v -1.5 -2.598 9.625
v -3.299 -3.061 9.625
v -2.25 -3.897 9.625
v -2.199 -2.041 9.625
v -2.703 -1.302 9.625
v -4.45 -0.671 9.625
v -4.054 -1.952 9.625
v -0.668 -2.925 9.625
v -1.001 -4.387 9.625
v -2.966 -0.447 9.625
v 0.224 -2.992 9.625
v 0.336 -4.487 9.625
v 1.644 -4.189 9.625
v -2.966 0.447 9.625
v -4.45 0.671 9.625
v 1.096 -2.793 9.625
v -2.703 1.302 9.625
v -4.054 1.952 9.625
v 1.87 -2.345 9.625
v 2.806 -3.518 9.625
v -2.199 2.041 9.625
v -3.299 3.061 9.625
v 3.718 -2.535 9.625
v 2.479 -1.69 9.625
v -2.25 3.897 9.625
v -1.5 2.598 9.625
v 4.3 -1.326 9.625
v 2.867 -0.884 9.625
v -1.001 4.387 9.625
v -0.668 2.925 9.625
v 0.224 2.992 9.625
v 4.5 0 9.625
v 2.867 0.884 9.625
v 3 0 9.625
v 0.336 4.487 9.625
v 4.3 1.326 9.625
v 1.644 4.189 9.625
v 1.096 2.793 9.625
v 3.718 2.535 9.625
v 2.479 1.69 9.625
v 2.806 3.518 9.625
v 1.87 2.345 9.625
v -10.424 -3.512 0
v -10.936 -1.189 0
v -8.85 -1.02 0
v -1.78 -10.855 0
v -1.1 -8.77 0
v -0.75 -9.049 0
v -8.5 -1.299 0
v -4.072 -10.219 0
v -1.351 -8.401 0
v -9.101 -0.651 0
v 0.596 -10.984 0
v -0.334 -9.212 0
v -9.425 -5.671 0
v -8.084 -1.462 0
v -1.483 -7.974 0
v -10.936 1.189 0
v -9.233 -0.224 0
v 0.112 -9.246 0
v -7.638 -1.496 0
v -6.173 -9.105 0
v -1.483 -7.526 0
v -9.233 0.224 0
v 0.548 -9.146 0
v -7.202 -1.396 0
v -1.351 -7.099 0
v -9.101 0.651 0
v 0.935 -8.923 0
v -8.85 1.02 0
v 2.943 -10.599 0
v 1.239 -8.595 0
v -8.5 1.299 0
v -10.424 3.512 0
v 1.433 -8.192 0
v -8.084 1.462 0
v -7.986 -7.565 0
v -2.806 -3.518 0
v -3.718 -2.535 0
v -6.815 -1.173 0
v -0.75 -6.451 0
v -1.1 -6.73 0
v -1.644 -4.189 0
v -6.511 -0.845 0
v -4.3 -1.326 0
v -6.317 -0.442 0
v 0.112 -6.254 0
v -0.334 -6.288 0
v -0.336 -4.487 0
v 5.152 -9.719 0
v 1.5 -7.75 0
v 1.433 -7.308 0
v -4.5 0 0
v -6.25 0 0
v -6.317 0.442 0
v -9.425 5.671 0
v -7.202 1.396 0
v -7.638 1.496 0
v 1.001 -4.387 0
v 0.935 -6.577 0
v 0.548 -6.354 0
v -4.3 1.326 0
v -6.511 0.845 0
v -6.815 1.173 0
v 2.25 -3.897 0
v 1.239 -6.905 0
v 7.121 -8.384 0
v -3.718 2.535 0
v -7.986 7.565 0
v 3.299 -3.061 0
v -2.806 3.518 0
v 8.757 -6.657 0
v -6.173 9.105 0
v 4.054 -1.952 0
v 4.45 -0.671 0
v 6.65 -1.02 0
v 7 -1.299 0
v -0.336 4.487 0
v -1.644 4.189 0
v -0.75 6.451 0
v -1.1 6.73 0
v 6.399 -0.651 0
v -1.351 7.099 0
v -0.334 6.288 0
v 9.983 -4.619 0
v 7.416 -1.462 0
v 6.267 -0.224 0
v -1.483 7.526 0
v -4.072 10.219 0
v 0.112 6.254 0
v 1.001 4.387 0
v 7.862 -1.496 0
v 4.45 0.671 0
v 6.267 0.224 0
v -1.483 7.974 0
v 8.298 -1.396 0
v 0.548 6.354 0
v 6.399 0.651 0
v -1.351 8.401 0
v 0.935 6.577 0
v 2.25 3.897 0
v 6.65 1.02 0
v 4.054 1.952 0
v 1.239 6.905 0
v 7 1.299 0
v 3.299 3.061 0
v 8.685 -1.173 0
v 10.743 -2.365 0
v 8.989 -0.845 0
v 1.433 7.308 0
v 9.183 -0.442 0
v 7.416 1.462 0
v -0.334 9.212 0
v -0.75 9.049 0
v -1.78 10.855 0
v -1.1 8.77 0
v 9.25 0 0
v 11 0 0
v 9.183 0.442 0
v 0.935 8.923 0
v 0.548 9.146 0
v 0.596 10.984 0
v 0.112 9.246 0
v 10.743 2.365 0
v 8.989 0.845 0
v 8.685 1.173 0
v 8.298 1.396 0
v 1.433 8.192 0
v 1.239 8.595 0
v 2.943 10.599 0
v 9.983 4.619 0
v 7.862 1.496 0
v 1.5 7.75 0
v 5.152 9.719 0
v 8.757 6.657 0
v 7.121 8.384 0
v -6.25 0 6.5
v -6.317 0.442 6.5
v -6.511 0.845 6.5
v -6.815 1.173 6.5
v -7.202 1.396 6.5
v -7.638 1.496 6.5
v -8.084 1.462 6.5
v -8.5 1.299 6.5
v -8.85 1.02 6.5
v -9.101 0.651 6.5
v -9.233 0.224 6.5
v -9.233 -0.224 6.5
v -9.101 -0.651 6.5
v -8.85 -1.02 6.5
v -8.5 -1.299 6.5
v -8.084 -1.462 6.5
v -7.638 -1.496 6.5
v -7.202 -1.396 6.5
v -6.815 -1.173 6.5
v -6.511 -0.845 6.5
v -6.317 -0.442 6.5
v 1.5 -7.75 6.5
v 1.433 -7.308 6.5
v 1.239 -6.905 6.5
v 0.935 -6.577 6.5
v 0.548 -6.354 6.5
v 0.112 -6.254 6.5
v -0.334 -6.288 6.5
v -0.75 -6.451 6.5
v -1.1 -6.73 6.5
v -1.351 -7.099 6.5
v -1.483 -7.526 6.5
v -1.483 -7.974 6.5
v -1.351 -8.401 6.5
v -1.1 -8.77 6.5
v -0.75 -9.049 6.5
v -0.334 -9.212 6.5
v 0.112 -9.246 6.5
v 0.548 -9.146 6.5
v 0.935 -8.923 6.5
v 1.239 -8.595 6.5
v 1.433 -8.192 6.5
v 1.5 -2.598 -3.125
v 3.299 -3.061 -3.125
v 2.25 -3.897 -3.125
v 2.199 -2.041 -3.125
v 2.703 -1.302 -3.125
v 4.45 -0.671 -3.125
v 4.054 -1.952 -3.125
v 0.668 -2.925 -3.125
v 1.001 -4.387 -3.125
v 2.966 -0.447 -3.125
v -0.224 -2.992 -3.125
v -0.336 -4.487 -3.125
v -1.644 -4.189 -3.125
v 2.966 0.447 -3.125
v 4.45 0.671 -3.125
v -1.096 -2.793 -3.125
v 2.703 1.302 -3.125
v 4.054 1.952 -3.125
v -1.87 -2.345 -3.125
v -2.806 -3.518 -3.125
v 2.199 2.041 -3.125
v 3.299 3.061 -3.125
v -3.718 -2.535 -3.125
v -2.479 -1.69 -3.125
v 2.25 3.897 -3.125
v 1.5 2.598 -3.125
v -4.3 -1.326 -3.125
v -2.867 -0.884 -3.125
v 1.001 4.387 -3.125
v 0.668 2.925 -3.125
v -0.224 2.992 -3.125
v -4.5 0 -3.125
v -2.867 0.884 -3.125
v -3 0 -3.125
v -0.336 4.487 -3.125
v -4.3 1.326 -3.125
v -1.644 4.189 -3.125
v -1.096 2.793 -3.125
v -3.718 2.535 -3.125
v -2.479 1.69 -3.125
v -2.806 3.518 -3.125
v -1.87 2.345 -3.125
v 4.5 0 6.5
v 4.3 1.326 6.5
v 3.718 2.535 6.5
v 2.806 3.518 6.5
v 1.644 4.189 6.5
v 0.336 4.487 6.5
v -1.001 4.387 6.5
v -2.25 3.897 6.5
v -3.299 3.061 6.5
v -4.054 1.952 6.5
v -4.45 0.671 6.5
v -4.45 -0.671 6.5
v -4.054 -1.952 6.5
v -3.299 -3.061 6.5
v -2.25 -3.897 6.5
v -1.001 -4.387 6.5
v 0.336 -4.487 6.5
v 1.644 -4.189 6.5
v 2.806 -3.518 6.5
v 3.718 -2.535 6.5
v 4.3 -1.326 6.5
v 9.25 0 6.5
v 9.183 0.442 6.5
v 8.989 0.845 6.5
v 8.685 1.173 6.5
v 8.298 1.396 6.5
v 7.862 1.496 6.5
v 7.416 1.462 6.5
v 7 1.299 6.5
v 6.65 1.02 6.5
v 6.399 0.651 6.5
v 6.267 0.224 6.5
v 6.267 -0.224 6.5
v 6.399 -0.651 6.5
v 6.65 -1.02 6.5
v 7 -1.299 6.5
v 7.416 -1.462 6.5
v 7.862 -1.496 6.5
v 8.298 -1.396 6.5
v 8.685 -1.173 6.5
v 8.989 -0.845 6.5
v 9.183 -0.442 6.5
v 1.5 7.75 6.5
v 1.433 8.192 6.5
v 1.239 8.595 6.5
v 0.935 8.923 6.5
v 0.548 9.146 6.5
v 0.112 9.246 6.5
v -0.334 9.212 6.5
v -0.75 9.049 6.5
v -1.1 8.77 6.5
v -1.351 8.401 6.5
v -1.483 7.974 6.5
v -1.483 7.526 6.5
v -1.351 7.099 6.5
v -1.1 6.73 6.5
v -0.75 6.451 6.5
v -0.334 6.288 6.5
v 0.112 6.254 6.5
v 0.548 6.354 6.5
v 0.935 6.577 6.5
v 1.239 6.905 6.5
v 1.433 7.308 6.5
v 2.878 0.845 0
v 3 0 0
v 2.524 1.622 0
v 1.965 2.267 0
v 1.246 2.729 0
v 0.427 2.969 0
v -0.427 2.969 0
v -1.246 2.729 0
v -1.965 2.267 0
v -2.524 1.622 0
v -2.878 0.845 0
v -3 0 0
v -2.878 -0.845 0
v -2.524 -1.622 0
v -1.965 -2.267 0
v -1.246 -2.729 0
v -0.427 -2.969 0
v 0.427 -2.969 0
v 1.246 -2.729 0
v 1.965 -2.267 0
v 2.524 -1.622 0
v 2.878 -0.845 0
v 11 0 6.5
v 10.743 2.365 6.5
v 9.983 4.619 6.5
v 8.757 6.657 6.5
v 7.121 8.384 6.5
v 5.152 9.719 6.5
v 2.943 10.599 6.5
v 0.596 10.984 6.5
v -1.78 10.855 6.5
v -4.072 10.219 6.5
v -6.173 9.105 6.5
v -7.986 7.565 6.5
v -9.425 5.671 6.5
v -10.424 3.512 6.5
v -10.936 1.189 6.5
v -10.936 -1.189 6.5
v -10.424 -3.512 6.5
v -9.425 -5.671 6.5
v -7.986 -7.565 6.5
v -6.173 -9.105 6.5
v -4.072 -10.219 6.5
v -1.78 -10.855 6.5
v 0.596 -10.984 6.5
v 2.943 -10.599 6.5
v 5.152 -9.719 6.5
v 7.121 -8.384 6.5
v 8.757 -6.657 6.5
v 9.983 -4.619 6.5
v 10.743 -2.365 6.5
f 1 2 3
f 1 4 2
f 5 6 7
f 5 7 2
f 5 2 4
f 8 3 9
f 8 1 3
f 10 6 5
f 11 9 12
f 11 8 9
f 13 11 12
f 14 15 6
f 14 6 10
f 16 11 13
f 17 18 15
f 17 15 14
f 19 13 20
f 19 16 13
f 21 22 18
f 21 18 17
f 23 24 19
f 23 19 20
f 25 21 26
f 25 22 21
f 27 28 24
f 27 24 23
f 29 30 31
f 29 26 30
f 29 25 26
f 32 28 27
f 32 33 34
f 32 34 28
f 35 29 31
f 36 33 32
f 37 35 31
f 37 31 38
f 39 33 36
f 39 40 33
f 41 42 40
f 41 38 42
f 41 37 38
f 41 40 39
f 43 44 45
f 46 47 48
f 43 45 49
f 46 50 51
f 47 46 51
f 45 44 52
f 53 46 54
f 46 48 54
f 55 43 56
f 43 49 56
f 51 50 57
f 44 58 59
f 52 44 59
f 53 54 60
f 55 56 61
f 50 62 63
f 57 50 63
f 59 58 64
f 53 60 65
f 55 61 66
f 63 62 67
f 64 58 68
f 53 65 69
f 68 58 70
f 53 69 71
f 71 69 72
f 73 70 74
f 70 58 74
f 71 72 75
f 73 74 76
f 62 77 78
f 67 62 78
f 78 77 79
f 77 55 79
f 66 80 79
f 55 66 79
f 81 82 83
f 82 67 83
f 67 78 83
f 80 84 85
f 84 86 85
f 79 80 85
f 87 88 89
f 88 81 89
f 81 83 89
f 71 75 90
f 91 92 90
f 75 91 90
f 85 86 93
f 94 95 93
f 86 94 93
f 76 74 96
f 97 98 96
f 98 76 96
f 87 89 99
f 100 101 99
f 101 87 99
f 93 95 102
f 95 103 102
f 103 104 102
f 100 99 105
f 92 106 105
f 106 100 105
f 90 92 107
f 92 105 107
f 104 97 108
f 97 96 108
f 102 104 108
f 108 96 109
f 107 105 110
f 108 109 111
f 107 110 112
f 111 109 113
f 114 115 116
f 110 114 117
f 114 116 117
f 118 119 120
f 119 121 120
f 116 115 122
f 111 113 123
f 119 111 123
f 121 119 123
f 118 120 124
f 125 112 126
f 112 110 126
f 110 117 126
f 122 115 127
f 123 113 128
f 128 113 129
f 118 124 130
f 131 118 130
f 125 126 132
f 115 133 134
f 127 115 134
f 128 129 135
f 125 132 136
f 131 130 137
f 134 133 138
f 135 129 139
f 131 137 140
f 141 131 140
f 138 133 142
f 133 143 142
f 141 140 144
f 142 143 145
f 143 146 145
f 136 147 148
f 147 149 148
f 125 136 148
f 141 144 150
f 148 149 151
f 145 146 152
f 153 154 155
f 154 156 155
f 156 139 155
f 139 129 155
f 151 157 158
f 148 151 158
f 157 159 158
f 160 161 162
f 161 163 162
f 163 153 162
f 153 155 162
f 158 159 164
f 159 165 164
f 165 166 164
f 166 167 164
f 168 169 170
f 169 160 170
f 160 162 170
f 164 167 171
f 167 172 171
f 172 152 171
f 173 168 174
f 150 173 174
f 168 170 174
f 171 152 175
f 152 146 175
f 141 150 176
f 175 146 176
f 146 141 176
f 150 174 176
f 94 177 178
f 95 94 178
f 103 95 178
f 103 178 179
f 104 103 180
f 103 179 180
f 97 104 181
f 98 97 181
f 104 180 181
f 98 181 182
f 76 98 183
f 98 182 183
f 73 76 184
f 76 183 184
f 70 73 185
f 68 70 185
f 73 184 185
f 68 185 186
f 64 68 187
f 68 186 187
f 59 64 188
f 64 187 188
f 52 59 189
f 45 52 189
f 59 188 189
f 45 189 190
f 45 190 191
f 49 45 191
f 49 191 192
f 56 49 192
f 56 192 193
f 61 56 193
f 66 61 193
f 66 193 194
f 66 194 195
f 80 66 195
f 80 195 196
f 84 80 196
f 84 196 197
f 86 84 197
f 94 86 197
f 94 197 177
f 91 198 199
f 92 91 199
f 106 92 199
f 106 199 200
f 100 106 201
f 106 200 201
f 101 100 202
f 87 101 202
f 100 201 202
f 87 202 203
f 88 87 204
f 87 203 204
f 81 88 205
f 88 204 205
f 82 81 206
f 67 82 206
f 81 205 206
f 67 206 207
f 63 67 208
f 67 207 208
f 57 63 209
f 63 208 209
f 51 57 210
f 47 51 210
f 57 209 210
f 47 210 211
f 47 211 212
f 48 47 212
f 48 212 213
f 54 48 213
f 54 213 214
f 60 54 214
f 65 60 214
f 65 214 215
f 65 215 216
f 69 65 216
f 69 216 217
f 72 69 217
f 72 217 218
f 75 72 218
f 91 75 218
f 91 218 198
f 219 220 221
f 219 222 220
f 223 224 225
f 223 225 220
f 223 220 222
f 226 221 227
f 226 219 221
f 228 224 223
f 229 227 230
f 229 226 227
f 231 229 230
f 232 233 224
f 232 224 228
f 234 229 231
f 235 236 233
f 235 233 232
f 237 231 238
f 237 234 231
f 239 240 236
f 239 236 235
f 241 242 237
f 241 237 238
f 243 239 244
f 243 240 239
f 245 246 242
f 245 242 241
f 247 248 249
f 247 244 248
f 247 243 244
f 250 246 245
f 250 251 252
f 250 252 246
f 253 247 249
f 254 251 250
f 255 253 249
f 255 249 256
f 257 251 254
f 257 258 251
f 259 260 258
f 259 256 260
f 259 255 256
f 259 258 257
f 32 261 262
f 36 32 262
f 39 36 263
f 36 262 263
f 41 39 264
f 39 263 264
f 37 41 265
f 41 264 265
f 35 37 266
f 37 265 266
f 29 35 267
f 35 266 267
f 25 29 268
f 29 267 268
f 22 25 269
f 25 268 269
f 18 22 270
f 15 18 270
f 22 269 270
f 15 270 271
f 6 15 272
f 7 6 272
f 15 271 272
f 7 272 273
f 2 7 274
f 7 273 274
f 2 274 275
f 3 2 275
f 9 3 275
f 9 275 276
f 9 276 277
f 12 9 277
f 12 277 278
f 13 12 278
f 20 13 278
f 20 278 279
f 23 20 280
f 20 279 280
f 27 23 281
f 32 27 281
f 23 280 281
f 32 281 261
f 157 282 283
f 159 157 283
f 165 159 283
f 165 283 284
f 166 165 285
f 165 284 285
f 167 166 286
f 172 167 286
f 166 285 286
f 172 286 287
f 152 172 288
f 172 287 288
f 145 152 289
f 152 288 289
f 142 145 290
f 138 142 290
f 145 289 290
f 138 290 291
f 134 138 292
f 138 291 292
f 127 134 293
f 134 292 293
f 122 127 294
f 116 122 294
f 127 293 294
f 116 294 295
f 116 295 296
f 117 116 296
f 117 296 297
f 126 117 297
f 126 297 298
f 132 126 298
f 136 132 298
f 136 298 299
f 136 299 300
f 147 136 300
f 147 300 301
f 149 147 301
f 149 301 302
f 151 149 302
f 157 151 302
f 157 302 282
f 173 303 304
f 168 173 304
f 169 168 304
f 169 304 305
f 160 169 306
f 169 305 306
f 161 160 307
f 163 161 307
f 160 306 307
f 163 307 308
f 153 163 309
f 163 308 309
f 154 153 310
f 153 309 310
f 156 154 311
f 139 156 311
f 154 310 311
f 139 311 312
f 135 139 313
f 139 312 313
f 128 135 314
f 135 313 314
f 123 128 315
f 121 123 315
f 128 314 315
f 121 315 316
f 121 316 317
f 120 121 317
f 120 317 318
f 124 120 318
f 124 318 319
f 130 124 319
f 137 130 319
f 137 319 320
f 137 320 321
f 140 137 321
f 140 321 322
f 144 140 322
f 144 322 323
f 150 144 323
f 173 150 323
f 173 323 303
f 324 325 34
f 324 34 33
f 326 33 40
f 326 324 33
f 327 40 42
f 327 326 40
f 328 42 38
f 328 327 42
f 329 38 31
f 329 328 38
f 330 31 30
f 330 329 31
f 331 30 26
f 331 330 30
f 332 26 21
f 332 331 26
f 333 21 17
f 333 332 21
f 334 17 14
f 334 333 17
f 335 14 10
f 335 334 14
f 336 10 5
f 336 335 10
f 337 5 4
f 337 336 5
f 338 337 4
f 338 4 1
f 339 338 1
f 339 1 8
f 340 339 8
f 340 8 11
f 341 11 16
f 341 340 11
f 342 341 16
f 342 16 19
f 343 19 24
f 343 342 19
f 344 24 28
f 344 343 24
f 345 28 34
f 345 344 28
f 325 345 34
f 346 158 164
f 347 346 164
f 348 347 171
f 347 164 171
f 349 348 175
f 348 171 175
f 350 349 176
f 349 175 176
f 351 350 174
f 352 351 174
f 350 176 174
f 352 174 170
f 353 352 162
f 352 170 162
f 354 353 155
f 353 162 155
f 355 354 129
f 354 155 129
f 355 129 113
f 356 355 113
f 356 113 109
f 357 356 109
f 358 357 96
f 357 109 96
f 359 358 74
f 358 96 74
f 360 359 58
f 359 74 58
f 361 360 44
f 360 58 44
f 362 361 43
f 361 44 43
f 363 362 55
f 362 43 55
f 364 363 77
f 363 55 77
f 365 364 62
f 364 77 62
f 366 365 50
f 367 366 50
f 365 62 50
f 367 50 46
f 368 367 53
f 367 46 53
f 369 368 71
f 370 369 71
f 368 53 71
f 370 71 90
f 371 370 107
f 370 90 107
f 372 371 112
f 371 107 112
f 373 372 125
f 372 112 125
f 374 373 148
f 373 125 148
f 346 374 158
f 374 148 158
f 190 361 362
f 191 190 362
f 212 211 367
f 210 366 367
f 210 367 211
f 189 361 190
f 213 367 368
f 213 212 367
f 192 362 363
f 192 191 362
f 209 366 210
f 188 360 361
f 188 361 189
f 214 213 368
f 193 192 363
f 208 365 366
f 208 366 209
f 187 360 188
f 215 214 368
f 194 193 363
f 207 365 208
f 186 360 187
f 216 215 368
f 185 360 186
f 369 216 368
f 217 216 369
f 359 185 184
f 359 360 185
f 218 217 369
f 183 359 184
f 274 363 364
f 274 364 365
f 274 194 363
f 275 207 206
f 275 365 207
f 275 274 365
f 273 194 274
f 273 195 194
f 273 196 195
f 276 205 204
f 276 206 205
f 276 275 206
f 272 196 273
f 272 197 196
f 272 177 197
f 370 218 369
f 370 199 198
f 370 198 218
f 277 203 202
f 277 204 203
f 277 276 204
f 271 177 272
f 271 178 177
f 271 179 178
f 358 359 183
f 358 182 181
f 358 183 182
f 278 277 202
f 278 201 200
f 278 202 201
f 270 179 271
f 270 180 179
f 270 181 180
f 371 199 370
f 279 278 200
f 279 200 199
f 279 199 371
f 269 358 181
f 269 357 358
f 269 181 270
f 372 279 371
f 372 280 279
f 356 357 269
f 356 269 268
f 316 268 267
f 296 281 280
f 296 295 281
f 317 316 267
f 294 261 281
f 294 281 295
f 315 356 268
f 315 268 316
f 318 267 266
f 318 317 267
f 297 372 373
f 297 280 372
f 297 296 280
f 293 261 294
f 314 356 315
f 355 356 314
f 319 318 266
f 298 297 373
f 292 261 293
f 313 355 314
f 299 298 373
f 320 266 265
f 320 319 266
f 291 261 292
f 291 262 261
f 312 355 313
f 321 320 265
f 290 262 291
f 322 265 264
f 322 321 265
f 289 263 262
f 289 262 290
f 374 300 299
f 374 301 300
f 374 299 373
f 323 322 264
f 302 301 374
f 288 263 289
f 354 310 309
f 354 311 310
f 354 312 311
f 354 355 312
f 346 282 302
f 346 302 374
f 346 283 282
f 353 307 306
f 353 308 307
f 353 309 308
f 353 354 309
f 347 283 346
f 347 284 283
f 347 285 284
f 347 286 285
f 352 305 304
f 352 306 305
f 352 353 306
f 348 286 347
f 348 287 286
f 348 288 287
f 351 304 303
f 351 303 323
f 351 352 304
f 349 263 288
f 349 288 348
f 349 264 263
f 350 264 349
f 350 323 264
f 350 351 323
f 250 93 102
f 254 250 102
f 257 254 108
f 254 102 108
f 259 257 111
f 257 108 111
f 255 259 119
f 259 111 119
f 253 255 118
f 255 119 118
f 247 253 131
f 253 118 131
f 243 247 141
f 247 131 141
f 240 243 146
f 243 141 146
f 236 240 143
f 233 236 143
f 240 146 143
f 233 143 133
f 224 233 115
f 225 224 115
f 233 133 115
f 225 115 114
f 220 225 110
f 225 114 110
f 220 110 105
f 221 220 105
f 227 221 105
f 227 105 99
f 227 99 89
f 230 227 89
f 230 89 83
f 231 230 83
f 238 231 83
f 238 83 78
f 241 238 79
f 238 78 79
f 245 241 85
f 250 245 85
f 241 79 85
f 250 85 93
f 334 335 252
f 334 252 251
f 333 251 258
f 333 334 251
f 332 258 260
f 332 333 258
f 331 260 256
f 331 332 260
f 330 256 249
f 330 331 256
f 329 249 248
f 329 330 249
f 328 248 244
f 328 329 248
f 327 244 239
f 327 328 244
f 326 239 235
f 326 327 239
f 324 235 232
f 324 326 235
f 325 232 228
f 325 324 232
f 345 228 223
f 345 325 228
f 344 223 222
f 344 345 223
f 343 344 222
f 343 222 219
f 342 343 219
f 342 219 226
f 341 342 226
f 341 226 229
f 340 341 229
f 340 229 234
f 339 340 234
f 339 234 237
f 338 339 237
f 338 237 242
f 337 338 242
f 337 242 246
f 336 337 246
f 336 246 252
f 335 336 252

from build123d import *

# Parameters (mm, degrees)
ESQUISSE1_R             = 11
ESQUISSE1_R_2           = 3
EXTRUSION1_DEPTH        = 6.5
ESQUISSE3_R             = 4.5
ESQUISSE3_R_2           = 3
EXTRUSION2_DEPTH        = 3.125
ESQUISSE4_R             = 4.5
ESQUISSE4_R_2           = 3
EXTRUSION3_DEPTH        = 3.125
ENL_V_MAT_EXTRU_1_REACH = 11.625
ESQUISSE5_R             = 1.5


with BuildPart() as part:
    # Esquisse1 → Extrusion1 (new body)
    with BuildSketch(Plane.XY):
        Circle(ESQUISSE1_R)
        Circle(ESQUISSE1_R_2, mode=Mode.SUBTRACT)
    extrude(amount=EXTRUSION1_DEPTH)

    # Esquisse3 → Extrusion2 (add)
    with BuildSketch(Plane.XY.offset(6.5)):
        Circle(ESQUISSE3_R)
        Circle(ESQUISSE3_R_2, mode=Mode.SUBTRACT)
    extrude(amount=EXTRUSION2_DEPTH)

    # Esquisse4 → Extrusion3 (add)
    with BuildSketch(Plane(origin=(0, 0, 0), x_dir=(-1, 0, 0), z_dir=(0, 0, -1))):
        Circle(ESQUISSE4_R)
        Circle(ESQUISSE4_R_2, mode=Mode.SUBTRACT)
    extrude(amount=EXTRUSION3_DEPTH)

    # Esquisse5 → Enlèv. mat.-Extru.1 (cut, up to next)
    with BuildSketch(Plane.XY.offset(6.5), mode=Mode.PRIVATE) as enl_v_mat_extru_1_sk1:
        with Locations((0, 7.75)):
            Circle(ESQUISSE5_R)
    enl_v_mat_extru_1_tool1 = extrude(enl_v_mat_extru_1_sk1.sketch, amount=-ENL_V_MAT_EXTRU_1_REACH, mode=Mode.PRIVATE) & part.part
    add(enl_v_mat_extru_1_tool1.solids().sort_by_distance((0, 7.75, 6.5))[0], mode=Mode.SUBTRACT)
    # Esquisse5 → Enlèv. mat.-Extru.1 (cut, up to next)
    with BuildSketch(Plane.XY.offset(6.5), mode=Mode.PRIVATE) as enl_v_mat_extru_1_sk2:
        with Locations((0, -7.75)):
            Circle(ESQUISSE5_R)
    enl_v_mat_extru_1_tool2 = extrude(enl_v_mat_extru_1_sk2.sketch, amount=-ENL_V_MAT_EXTRU_1_REACH, mode=Mode.PRIVATE) & part.part
    add(enl_v_mat_extru_1_tool2.solids().sort_by_distance((0, -7.75, 6.5))[0], mode=Mode.SUBTRACT)
    # Esquisse5 → Enlèv. mat.-Extru.1 (cut, up to next)
    with BuildSketch(Plane.XY.offset(6.5), mode=Mode.PRIVATE) as enl_v_mat_extru_1_sk3:
        with Locations((-7.75, 0)):
            Circle(ESQUISSE5_R)
    enl_v_mat_extru_1_tool3 = extrude(enl_v_mat_extru_1_sk3.sketch, amount=-ENL_V_MAT_EXTRU_1_REACH, mode=Mode.PRIVATE) & part.part
    add(enl_v_mat_extru_1_tool3.solids().sort_by_distance((-7.75, 0, 6.5))[0], mode=Mode.SUBTRACT)
    # Esquisse5 → Enlèv. mat.-Extru.1 (cut, up to next)
    with BuildSketch(Plane.XY.offset(6.5), mode=Mode.PRIVATE) as enl_v_mat_extru_1_sk4:
        with Locations((7.75, 0)):
            Circle(ESQUISSE5_R)
    enl_v_mat_extru_1_tool4 = extrude(enl_v_mat_extru_1_sk4.sketch, amount=-ENL_V_MAT_EXTRU_1_REACH, mode=Mode.PRIVATE) & part.part
    add(enl_v_mat_extru_1_tool4.solids().sort_by_distance((7.75, 0, 6.5))[0], mode=Mode.SUBTRACT)


solid = part.part
